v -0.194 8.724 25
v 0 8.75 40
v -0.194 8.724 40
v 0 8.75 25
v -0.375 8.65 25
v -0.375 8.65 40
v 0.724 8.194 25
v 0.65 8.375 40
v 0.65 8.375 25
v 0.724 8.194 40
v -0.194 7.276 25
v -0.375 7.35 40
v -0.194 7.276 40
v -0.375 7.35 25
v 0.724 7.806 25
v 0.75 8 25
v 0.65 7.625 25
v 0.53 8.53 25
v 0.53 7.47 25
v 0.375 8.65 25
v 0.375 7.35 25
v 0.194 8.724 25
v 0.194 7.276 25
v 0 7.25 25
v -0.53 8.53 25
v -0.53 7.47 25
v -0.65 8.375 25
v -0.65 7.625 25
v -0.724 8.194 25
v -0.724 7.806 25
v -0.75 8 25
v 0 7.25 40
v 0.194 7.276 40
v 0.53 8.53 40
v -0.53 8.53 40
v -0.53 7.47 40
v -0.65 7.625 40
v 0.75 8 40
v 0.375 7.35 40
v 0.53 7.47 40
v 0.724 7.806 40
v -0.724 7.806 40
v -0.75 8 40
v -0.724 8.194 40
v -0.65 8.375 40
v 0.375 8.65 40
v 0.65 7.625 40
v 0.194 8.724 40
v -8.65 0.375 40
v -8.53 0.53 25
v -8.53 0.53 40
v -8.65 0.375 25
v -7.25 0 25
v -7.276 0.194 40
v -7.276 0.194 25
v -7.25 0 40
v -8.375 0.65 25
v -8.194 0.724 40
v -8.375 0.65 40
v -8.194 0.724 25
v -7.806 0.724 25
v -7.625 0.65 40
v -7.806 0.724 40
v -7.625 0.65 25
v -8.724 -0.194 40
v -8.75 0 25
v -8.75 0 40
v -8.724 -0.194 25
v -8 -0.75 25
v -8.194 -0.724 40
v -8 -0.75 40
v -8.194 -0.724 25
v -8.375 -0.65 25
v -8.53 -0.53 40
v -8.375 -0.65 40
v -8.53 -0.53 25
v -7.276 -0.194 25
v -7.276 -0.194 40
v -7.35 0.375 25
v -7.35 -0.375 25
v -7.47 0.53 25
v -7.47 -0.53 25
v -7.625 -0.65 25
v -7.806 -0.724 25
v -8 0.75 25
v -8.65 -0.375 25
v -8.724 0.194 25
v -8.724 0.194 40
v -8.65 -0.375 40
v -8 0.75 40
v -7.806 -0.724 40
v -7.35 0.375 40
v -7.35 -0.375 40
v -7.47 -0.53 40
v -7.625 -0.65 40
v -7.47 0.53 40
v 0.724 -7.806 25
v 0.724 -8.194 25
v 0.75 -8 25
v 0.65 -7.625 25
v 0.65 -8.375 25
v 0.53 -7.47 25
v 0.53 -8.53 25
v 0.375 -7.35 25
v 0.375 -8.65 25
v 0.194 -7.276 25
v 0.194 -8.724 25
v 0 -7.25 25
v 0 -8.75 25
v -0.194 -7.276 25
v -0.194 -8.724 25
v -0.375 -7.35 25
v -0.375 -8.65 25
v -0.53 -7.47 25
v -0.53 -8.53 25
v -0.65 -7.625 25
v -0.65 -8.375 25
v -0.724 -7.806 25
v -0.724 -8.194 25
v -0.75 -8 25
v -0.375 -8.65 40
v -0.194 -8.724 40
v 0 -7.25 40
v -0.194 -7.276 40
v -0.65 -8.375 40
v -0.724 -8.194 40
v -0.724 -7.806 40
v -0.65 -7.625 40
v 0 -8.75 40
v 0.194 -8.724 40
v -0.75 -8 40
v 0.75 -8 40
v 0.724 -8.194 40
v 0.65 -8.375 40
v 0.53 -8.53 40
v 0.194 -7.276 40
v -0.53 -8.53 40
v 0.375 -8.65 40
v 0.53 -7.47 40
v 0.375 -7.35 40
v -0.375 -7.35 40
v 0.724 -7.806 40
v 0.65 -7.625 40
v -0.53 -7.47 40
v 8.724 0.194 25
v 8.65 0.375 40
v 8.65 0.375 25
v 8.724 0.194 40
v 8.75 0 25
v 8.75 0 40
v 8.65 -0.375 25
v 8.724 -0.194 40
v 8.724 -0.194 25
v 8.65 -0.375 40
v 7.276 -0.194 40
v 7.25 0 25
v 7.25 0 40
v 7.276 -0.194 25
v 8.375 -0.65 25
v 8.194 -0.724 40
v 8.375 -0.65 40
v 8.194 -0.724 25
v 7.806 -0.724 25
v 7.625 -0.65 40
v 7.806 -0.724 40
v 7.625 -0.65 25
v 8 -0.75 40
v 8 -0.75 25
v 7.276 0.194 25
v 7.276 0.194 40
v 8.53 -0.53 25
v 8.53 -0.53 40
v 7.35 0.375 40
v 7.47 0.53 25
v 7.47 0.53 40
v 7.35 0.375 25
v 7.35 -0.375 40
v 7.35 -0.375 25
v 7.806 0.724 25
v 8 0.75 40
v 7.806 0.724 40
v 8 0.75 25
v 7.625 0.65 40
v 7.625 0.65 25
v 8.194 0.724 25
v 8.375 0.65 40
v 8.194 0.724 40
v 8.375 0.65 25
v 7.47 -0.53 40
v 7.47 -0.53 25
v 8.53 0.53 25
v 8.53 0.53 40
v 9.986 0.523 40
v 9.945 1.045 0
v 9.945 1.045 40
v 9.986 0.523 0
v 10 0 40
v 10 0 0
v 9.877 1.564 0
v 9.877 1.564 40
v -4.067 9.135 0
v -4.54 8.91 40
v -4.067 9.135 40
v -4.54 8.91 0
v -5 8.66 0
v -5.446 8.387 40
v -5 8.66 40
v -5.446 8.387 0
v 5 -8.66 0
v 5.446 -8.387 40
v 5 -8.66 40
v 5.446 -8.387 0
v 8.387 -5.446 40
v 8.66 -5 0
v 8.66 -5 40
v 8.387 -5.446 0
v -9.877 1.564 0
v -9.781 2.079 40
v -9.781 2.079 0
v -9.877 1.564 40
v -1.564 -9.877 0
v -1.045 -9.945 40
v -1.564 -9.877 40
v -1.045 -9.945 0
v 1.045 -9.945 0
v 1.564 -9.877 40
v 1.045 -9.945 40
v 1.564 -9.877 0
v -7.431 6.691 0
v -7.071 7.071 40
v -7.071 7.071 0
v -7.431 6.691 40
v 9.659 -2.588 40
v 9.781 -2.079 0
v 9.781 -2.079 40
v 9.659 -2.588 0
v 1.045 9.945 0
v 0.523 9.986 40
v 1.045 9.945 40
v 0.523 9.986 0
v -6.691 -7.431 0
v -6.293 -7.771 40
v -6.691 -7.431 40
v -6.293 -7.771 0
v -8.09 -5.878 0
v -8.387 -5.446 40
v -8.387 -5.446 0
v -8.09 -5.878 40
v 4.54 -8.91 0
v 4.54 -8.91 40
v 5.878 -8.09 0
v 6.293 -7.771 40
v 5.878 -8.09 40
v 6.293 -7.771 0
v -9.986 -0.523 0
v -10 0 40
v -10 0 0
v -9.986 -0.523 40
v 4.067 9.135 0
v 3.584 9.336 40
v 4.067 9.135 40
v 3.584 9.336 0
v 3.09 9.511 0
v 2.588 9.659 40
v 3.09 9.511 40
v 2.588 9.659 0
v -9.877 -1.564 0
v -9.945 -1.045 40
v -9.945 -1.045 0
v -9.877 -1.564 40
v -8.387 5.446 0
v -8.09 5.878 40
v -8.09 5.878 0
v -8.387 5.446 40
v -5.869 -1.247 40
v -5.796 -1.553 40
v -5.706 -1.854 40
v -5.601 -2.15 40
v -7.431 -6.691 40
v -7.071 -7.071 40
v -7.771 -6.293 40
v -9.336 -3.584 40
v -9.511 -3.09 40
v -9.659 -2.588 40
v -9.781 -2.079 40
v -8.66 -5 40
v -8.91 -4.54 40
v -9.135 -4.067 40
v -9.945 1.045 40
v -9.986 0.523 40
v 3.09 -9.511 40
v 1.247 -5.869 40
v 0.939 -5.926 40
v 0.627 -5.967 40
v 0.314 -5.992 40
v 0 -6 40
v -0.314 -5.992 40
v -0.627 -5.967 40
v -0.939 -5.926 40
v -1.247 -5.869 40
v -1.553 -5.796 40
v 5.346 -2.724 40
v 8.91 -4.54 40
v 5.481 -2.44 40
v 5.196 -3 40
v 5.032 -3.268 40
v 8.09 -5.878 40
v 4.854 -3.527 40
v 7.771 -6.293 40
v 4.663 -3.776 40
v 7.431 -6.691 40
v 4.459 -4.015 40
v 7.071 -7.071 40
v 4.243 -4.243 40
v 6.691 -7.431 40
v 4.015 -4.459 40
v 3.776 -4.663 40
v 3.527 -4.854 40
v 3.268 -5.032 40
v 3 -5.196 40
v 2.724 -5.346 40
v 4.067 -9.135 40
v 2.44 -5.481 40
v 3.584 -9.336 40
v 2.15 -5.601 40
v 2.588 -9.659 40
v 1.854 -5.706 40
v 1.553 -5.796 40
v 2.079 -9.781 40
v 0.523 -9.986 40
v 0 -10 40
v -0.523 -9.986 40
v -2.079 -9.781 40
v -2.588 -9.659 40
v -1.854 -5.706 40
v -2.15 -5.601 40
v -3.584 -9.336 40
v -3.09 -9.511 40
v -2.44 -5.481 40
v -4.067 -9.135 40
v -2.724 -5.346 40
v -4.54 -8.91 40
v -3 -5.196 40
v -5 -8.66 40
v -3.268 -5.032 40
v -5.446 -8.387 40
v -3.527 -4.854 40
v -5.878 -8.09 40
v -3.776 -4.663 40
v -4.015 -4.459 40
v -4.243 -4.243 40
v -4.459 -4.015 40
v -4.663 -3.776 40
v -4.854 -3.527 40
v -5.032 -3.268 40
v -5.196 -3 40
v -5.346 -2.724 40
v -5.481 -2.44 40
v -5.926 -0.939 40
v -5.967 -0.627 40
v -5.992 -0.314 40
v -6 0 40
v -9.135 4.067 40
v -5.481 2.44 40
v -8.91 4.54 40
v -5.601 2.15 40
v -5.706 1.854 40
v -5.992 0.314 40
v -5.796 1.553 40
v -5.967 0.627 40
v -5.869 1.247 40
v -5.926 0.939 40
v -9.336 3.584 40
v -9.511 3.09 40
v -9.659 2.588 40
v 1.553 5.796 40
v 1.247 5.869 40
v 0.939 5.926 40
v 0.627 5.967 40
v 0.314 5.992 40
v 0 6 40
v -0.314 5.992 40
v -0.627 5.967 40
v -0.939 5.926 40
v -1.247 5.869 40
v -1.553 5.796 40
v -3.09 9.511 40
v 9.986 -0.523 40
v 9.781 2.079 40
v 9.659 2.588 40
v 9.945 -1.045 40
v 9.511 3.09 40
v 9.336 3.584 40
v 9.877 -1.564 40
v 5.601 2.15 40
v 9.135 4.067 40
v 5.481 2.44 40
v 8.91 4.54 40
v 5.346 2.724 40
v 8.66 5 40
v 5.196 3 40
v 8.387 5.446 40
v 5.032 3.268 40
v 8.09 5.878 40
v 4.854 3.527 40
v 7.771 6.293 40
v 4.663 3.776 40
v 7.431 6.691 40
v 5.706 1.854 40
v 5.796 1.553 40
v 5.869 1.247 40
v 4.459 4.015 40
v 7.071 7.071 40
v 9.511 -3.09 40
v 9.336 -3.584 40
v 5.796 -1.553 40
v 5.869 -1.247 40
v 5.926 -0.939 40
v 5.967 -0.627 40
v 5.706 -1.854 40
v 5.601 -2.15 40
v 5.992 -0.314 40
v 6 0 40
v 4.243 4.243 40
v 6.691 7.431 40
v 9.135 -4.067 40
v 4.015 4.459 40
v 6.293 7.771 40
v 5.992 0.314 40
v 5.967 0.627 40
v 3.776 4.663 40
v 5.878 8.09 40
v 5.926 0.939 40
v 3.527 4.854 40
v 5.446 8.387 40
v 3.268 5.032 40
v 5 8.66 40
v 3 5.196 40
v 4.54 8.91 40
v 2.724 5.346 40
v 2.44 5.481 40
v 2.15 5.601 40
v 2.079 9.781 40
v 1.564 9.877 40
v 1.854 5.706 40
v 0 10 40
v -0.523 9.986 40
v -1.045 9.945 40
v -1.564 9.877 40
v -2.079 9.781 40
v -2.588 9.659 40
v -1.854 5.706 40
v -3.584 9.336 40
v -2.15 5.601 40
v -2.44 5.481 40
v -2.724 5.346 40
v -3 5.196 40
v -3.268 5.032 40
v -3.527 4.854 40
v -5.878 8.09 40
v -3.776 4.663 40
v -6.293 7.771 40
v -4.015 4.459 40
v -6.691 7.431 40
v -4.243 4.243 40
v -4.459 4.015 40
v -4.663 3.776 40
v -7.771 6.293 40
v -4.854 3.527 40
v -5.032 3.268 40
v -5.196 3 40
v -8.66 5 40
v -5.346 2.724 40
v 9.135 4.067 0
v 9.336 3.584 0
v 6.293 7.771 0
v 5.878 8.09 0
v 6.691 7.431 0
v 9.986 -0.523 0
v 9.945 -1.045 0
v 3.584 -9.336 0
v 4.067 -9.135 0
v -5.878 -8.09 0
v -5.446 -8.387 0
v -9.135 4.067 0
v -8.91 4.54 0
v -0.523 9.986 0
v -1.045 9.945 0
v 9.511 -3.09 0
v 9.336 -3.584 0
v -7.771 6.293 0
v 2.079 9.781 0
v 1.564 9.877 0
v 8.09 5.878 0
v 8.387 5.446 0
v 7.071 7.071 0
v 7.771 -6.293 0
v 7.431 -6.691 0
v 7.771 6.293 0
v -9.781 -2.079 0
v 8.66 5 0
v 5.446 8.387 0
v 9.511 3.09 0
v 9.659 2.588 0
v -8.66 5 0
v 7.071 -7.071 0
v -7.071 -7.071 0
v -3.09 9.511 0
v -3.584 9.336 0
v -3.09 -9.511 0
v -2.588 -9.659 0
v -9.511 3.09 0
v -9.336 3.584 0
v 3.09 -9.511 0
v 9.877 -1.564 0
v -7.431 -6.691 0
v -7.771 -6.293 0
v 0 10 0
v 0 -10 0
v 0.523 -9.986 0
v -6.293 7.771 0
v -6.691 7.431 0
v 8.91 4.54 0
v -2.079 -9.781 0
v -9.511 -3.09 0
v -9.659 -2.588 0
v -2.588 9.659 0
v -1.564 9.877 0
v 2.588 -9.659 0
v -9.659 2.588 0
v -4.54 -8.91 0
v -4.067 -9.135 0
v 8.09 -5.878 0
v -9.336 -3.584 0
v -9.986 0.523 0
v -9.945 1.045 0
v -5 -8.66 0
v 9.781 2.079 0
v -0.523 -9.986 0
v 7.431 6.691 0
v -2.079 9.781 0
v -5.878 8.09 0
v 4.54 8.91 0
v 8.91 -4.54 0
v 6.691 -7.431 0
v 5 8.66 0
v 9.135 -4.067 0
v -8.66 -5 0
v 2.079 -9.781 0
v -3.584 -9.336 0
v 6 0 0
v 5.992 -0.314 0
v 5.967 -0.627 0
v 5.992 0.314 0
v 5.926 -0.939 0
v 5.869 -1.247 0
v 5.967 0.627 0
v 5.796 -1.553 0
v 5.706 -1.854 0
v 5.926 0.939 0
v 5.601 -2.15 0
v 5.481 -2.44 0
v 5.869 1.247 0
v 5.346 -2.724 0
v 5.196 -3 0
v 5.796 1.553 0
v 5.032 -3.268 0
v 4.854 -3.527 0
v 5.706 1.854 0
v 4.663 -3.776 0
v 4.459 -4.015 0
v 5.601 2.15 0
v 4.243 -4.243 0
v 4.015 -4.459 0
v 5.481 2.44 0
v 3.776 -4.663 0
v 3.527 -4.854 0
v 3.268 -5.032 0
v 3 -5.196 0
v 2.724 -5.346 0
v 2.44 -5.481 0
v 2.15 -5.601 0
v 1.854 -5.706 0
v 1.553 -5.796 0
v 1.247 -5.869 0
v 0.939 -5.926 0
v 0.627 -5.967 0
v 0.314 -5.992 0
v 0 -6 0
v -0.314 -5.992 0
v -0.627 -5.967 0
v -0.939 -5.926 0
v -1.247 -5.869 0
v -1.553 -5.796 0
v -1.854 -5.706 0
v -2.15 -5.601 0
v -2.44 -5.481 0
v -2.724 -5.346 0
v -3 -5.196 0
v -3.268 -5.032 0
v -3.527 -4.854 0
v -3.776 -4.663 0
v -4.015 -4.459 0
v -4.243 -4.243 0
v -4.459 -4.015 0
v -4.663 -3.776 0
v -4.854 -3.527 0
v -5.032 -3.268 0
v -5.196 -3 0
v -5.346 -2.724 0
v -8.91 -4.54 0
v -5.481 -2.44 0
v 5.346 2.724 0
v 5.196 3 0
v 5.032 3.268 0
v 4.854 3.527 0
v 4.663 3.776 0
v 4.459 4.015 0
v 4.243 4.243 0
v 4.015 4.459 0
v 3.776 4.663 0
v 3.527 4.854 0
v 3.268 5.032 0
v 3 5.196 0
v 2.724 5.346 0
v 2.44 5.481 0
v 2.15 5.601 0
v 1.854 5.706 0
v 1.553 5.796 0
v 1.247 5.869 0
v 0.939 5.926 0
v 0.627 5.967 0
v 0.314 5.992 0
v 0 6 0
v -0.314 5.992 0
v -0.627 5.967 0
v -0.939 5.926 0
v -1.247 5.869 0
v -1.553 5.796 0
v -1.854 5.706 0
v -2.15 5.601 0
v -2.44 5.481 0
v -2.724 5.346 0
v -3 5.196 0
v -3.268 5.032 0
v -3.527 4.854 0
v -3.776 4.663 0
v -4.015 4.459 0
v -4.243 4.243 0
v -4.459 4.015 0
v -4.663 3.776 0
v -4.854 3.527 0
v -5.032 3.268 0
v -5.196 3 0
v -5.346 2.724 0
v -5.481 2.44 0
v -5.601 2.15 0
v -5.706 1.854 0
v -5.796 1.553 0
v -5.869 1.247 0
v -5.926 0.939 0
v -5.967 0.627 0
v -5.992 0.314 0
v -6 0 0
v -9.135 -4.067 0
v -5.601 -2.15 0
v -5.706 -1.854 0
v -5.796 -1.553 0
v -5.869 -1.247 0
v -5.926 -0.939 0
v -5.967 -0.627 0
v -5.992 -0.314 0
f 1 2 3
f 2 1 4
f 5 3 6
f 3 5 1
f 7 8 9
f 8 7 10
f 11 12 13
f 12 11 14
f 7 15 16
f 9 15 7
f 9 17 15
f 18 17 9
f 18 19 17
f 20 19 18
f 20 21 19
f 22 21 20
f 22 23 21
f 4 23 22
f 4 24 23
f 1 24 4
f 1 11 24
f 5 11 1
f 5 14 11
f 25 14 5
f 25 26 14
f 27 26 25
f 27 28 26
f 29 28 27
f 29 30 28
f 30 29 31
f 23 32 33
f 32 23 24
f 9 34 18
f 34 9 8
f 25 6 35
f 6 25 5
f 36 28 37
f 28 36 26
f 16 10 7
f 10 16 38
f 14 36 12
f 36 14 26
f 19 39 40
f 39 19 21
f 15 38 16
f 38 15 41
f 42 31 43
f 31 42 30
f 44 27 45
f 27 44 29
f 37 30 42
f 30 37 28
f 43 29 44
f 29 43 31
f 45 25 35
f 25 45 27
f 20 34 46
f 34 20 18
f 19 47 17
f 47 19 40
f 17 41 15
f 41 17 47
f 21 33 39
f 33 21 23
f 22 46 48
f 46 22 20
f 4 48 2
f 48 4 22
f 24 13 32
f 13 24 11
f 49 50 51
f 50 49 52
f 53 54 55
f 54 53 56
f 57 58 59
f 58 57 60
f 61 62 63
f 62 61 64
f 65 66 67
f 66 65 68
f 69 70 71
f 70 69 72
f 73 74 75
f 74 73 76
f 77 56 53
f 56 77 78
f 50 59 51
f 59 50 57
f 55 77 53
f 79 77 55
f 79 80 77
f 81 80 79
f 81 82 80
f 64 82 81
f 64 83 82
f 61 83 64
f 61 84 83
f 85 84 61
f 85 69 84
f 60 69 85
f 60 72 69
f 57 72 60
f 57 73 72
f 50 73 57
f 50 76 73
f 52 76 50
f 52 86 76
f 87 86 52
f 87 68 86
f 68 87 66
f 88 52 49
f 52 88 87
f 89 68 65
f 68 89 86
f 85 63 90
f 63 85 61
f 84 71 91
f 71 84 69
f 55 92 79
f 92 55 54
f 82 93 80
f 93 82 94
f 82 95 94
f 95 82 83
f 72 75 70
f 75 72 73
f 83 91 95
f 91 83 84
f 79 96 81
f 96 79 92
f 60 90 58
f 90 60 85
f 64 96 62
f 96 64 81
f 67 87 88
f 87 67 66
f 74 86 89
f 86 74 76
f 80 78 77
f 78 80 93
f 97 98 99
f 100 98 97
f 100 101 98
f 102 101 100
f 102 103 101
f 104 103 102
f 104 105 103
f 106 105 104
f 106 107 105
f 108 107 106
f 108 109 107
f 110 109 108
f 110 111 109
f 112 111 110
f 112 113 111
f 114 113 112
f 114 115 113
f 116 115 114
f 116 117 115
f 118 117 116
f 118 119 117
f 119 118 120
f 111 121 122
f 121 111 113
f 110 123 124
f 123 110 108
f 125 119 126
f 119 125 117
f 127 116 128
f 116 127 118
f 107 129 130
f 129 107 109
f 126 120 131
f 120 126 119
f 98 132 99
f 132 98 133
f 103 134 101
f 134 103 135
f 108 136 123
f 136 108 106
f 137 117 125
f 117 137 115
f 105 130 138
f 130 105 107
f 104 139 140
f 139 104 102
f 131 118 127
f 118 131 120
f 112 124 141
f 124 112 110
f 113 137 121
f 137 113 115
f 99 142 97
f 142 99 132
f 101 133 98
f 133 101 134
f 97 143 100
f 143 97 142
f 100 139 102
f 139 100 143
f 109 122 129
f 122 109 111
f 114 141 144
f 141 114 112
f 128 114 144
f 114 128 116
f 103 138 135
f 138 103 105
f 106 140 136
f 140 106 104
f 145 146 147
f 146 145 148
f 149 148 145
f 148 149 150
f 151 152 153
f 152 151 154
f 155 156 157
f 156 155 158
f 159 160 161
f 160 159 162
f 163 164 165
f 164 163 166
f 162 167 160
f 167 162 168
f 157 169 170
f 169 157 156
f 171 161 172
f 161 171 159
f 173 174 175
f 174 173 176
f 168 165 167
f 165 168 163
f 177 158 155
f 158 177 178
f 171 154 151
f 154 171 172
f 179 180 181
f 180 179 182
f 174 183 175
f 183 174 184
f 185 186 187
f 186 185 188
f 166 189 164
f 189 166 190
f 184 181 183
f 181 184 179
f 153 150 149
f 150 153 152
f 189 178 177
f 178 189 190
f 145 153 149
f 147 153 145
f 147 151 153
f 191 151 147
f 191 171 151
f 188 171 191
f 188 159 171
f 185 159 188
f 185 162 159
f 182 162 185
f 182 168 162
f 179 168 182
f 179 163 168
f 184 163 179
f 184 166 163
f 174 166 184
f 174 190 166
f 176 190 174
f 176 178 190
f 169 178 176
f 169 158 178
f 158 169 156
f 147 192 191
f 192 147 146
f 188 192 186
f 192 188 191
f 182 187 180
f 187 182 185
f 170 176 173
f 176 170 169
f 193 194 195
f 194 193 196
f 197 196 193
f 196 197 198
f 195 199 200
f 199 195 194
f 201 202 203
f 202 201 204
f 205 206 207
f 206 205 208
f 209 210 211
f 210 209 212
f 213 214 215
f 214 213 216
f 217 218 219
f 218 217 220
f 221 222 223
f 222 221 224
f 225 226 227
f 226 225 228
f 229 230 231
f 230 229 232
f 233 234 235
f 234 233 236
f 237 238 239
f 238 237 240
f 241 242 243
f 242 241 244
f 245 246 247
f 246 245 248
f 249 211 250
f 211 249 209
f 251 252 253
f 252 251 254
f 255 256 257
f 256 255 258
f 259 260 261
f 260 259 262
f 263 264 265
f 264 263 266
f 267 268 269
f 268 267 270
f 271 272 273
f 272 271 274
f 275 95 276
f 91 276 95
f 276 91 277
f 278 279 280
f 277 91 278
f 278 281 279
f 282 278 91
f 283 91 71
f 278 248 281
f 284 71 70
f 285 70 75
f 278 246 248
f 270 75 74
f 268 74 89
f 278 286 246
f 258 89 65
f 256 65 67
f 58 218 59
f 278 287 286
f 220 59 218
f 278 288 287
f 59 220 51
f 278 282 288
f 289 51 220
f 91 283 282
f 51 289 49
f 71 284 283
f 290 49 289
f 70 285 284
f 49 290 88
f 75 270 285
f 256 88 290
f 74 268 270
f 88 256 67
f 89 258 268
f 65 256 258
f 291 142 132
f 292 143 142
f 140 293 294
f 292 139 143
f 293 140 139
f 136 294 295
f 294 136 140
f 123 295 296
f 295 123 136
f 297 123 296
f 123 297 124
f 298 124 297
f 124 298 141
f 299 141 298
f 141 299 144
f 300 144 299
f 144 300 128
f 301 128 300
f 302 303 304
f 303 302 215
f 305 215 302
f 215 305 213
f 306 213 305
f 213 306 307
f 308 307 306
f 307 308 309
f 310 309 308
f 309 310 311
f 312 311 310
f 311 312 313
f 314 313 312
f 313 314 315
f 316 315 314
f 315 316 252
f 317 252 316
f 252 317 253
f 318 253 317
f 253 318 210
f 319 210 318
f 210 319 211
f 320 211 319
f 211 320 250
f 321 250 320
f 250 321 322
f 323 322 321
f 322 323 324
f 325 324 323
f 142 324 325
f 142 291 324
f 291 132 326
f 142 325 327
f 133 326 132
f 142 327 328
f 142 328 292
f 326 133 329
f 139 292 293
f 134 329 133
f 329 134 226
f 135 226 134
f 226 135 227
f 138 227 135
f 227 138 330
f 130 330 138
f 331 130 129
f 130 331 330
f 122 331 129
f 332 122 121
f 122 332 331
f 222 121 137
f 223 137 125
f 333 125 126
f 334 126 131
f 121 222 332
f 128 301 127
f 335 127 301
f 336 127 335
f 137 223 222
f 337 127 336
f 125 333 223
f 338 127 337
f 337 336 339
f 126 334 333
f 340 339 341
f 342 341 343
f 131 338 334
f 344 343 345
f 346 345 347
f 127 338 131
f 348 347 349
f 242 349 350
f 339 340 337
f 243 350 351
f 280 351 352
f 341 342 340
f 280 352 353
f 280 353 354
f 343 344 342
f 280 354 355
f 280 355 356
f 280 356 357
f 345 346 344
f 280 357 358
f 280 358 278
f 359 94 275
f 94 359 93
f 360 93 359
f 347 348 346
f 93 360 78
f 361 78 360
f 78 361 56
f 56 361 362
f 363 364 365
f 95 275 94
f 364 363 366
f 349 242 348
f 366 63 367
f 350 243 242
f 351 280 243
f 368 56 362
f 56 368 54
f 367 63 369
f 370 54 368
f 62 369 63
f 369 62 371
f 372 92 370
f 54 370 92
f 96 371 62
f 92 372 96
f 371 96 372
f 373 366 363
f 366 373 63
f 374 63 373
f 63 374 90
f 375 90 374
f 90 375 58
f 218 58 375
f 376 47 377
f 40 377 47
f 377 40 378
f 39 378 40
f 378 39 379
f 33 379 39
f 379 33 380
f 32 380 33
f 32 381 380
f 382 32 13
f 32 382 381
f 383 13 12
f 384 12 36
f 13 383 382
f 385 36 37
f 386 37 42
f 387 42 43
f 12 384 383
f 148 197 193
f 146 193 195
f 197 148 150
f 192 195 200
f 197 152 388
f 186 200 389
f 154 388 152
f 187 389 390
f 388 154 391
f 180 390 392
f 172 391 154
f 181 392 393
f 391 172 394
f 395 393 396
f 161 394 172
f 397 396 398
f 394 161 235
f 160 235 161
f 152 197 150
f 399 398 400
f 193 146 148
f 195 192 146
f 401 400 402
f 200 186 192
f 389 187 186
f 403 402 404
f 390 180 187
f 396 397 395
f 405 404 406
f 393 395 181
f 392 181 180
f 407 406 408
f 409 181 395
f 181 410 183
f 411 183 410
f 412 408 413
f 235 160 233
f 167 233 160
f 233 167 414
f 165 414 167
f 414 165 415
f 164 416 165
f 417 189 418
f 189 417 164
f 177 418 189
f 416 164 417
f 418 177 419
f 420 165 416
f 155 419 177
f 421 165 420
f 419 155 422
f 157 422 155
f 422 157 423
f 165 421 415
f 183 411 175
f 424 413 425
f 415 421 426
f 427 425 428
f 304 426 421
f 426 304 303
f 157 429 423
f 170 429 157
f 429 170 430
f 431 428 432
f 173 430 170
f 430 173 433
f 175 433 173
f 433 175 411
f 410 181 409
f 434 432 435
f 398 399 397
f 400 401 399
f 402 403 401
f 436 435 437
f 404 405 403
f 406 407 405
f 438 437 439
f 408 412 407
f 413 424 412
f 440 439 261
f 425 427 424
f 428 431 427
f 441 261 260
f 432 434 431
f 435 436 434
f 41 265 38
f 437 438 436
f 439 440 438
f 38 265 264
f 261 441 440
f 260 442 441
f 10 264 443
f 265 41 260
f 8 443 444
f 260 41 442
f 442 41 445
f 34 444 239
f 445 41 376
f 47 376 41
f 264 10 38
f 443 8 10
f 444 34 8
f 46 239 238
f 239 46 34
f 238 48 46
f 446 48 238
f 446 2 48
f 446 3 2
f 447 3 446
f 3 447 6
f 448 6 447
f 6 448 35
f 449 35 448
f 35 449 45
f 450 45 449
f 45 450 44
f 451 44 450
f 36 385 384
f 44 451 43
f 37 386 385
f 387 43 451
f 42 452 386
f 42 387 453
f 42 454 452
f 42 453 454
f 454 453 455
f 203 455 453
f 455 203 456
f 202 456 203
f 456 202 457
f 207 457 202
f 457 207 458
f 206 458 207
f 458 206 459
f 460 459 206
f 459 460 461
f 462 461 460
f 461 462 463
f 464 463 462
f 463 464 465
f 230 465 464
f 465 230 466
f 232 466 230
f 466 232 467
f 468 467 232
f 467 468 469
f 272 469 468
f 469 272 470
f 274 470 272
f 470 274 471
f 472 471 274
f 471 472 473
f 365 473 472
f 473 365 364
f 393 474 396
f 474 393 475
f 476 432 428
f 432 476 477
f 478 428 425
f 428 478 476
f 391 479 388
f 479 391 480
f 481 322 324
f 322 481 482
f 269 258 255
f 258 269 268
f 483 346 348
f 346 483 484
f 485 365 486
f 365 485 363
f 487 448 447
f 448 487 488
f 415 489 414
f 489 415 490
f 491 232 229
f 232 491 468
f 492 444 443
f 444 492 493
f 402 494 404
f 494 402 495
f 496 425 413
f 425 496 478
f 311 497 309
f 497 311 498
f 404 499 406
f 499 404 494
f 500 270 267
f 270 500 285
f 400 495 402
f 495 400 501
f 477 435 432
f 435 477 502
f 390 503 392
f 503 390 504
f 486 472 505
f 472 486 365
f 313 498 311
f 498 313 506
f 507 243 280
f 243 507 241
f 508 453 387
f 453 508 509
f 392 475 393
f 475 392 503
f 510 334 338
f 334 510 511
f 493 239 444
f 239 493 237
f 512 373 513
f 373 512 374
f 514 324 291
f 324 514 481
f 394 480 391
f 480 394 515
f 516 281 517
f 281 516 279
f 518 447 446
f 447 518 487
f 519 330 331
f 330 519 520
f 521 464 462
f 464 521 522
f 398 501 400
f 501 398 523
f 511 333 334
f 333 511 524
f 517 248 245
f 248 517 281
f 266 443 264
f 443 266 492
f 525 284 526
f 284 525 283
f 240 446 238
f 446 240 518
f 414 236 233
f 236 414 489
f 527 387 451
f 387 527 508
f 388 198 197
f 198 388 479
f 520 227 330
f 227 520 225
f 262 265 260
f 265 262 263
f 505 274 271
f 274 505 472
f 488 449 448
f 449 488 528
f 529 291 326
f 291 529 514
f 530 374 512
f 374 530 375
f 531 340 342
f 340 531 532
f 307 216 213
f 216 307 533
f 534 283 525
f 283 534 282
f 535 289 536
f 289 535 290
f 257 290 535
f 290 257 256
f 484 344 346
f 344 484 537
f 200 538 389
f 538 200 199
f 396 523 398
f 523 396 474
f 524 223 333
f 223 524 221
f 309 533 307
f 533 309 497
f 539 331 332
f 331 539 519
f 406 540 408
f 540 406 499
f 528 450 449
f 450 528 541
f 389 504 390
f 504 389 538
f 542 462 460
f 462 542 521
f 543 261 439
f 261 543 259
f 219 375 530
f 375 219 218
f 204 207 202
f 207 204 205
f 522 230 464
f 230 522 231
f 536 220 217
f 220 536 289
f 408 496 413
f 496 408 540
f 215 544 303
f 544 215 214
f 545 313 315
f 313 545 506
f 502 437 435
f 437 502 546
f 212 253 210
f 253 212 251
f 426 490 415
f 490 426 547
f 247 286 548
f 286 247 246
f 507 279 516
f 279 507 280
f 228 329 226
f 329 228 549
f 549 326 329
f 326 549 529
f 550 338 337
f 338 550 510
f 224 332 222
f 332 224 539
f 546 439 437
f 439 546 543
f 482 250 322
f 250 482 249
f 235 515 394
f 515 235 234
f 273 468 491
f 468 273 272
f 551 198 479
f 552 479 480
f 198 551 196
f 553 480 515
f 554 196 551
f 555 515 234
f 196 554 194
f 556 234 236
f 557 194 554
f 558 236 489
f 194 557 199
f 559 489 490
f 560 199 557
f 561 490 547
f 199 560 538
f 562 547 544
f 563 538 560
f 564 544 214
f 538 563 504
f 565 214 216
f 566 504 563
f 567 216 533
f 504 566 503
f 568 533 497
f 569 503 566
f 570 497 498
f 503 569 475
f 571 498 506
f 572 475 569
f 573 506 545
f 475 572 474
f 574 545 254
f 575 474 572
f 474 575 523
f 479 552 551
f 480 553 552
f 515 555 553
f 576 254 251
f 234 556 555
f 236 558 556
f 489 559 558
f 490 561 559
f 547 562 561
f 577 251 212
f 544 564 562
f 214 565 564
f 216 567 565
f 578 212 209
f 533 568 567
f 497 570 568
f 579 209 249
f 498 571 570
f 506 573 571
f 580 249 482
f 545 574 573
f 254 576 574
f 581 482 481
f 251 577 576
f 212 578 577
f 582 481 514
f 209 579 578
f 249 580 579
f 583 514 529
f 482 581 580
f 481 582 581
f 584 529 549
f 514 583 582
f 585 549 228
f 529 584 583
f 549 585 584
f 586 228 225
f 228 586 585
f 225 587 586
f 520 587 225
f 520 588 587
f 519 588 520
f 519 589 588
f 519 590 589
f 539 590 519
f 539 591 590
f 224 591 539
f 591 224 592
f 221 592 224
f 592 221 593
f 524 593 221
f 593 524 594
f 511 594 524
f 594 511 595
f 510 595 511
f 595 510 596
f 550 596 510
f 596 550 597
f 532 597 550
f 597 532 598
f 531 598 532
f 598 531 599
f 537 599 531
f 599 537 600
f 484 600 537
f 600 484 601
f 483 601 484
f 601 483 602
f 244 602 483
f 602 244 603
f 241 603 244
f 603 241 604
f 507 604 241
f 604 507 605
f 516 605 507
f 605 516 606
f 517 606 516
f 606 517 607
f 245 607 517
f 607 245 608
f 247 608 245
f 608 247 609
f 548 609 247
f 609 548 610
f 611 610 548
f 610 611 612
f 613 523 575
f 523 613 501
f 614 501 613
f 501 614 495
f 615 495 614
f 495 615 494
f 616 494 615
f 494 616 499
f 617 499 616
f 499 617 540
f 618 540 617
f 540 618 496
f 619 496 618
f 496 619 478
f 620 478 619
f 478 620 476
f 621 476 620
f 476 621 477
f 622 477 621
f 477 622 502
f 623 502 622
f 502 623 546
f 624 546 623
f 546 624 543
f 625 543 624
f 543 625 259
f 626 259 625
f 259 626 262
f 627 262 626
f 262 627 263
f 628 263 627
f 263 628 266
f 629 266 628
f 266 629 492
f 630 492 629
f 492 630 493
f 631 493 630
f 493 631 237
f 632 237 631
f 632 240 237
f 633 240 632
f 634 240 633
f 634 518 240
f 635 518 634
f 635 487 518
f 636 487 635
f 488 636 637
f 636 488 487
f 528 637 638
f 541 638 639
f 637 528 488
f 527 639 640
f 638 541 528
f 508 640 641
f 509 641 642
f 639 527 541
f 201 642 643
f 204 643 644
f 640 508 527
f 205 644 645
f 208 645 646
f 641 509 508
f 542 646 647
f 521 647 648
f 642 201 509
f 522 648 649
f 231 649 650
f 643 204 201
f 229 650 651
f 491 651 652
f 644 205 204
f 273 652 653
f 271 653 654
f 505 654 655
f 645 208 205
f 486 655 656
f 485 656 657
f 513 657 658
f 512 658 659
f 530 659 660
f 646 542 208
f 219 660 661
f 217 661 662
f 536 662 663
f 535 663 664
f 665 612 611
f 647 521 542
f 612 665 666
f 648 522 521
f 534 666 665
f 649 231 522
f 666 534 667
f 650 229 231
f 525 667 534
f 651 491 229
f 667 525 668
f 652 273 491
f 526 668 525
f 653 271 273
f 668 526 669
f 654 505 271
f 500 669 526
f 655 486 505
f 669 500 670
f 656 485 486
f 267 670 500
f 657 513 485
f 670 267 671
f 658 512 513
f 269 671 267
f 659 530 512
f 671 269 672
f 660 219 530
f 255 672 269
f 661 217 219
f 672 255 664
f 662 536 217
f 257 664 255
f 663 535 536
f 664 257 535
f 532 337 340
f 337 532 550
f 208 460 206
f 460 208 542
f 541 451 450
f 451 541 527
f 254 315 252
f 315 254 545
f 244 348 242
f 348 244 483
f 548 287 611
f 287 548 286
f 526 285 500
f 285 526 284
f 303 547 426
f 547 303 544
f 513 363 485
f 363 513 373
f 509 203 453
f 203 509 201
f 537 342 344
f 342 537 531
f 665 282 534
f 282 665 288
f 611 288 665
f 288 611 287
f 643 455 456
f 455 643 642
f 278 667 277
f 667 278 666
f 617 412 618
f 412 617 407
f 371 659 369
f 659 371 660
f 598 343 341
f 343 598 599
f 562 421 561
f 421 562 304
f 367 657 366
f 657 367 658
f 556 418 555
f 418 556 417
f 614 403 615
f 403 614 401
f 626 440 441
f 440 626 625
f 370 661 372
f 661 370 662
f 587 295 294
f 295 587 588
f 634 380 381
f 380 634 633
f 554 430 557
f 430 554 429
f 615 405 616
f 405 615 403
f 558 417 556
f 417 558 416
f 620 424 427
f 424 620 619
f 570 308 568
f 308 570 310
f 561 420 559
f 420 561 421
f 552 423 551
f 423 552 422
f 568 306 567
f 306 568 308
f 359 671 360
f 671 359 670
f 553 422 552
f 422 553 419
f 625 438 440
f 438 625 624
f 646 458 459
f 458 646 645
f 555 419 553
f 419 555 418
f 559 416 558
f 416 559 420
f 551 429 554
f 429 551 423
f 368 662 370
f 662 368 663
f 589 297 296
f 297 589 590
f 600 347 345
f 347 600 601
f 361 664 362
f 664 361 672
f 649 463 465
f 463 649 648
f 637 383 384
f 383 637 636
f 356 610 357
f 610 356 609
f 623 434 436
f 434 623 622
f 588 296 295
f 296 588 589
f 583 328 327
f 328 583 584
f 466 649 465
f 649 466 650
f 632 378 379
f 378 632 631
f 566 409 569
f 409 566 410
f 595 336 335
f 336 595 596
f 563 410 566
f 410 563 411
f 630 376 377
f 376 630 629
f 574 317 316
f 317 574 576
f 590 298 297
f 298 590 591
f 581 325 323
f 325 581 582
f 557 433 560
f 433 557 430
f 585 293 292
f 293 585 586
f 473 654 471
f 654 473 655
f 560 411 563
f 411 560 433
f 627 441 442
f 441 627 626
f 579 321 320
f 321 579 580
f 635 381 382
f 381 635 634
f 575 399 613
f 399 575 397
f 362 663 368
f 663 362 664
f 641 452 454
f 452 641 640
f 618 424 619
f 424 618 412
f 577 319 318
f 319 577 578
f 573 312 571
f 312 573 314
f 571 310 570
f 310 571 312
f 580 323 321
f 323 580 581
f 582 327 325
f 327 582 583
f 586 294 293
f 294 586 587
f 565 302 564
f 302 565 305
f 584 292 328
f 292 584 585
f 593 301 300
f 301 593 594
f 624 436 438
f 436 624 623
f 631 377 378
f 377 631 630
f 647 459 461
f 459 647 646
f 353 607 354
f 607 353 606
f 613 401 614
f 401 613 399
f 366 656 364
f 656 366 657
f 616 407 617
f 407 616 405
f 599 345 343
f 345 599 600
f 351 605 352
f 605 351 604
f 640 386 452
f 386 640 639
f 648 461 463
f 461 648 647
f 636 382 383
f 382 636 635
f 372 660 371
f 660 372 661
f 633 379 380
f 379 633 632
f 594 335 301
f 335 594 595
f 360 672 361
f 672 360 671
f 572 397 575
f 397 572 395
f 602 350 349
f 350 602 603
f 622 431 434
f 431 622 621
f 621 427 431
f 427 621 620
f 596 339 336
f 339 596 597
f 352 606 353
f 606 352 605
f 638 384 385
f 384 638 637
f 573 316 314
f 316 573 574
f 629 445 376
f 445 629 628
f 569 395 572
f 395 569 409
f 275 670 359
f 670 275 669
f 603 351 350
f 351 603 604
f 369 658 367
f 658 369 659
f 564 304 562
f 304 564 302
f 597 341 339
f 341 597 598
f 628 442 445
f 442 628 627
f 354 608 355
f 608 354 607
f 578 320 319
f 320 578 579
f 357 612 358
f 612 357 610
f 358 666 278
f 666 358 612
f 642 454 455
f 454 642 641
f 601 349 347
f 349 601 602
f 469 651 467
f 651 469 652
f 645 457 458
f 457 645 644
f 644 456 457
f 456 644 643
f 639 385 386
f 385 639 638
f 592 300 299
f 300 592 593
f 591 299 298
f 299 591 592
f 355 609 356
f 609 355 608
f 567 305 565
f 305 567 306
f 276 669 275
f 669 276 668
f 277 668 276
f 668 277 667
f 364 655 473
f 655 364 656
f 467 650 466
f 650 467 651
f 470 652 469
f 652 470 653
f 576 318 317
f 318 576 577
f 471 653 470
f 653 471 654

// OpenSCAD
$fa=3;
$fs=0.2;

module knitter(height=20, di=10, do=16, nail_dia=1.5, nail_depth=10) {
  difference() {
    cylinder(d=do, h=height);
    cylinder(d=di, h=height*3, center=true);
    for(i=[1:4]) {
      rotate([0,0,90*i])
        translate([(di+do)/4,0,height-nail_depth])
          cylinder(d=nail_dia, h=nail_depth*2);
    }
  }
}

//knitter(height=20, di=10, do=16, nail_dia=1.5, nail_depth=10);
knitter(height=40, di=12, do=20, nail_dia=1.5, nail_depth=15);
